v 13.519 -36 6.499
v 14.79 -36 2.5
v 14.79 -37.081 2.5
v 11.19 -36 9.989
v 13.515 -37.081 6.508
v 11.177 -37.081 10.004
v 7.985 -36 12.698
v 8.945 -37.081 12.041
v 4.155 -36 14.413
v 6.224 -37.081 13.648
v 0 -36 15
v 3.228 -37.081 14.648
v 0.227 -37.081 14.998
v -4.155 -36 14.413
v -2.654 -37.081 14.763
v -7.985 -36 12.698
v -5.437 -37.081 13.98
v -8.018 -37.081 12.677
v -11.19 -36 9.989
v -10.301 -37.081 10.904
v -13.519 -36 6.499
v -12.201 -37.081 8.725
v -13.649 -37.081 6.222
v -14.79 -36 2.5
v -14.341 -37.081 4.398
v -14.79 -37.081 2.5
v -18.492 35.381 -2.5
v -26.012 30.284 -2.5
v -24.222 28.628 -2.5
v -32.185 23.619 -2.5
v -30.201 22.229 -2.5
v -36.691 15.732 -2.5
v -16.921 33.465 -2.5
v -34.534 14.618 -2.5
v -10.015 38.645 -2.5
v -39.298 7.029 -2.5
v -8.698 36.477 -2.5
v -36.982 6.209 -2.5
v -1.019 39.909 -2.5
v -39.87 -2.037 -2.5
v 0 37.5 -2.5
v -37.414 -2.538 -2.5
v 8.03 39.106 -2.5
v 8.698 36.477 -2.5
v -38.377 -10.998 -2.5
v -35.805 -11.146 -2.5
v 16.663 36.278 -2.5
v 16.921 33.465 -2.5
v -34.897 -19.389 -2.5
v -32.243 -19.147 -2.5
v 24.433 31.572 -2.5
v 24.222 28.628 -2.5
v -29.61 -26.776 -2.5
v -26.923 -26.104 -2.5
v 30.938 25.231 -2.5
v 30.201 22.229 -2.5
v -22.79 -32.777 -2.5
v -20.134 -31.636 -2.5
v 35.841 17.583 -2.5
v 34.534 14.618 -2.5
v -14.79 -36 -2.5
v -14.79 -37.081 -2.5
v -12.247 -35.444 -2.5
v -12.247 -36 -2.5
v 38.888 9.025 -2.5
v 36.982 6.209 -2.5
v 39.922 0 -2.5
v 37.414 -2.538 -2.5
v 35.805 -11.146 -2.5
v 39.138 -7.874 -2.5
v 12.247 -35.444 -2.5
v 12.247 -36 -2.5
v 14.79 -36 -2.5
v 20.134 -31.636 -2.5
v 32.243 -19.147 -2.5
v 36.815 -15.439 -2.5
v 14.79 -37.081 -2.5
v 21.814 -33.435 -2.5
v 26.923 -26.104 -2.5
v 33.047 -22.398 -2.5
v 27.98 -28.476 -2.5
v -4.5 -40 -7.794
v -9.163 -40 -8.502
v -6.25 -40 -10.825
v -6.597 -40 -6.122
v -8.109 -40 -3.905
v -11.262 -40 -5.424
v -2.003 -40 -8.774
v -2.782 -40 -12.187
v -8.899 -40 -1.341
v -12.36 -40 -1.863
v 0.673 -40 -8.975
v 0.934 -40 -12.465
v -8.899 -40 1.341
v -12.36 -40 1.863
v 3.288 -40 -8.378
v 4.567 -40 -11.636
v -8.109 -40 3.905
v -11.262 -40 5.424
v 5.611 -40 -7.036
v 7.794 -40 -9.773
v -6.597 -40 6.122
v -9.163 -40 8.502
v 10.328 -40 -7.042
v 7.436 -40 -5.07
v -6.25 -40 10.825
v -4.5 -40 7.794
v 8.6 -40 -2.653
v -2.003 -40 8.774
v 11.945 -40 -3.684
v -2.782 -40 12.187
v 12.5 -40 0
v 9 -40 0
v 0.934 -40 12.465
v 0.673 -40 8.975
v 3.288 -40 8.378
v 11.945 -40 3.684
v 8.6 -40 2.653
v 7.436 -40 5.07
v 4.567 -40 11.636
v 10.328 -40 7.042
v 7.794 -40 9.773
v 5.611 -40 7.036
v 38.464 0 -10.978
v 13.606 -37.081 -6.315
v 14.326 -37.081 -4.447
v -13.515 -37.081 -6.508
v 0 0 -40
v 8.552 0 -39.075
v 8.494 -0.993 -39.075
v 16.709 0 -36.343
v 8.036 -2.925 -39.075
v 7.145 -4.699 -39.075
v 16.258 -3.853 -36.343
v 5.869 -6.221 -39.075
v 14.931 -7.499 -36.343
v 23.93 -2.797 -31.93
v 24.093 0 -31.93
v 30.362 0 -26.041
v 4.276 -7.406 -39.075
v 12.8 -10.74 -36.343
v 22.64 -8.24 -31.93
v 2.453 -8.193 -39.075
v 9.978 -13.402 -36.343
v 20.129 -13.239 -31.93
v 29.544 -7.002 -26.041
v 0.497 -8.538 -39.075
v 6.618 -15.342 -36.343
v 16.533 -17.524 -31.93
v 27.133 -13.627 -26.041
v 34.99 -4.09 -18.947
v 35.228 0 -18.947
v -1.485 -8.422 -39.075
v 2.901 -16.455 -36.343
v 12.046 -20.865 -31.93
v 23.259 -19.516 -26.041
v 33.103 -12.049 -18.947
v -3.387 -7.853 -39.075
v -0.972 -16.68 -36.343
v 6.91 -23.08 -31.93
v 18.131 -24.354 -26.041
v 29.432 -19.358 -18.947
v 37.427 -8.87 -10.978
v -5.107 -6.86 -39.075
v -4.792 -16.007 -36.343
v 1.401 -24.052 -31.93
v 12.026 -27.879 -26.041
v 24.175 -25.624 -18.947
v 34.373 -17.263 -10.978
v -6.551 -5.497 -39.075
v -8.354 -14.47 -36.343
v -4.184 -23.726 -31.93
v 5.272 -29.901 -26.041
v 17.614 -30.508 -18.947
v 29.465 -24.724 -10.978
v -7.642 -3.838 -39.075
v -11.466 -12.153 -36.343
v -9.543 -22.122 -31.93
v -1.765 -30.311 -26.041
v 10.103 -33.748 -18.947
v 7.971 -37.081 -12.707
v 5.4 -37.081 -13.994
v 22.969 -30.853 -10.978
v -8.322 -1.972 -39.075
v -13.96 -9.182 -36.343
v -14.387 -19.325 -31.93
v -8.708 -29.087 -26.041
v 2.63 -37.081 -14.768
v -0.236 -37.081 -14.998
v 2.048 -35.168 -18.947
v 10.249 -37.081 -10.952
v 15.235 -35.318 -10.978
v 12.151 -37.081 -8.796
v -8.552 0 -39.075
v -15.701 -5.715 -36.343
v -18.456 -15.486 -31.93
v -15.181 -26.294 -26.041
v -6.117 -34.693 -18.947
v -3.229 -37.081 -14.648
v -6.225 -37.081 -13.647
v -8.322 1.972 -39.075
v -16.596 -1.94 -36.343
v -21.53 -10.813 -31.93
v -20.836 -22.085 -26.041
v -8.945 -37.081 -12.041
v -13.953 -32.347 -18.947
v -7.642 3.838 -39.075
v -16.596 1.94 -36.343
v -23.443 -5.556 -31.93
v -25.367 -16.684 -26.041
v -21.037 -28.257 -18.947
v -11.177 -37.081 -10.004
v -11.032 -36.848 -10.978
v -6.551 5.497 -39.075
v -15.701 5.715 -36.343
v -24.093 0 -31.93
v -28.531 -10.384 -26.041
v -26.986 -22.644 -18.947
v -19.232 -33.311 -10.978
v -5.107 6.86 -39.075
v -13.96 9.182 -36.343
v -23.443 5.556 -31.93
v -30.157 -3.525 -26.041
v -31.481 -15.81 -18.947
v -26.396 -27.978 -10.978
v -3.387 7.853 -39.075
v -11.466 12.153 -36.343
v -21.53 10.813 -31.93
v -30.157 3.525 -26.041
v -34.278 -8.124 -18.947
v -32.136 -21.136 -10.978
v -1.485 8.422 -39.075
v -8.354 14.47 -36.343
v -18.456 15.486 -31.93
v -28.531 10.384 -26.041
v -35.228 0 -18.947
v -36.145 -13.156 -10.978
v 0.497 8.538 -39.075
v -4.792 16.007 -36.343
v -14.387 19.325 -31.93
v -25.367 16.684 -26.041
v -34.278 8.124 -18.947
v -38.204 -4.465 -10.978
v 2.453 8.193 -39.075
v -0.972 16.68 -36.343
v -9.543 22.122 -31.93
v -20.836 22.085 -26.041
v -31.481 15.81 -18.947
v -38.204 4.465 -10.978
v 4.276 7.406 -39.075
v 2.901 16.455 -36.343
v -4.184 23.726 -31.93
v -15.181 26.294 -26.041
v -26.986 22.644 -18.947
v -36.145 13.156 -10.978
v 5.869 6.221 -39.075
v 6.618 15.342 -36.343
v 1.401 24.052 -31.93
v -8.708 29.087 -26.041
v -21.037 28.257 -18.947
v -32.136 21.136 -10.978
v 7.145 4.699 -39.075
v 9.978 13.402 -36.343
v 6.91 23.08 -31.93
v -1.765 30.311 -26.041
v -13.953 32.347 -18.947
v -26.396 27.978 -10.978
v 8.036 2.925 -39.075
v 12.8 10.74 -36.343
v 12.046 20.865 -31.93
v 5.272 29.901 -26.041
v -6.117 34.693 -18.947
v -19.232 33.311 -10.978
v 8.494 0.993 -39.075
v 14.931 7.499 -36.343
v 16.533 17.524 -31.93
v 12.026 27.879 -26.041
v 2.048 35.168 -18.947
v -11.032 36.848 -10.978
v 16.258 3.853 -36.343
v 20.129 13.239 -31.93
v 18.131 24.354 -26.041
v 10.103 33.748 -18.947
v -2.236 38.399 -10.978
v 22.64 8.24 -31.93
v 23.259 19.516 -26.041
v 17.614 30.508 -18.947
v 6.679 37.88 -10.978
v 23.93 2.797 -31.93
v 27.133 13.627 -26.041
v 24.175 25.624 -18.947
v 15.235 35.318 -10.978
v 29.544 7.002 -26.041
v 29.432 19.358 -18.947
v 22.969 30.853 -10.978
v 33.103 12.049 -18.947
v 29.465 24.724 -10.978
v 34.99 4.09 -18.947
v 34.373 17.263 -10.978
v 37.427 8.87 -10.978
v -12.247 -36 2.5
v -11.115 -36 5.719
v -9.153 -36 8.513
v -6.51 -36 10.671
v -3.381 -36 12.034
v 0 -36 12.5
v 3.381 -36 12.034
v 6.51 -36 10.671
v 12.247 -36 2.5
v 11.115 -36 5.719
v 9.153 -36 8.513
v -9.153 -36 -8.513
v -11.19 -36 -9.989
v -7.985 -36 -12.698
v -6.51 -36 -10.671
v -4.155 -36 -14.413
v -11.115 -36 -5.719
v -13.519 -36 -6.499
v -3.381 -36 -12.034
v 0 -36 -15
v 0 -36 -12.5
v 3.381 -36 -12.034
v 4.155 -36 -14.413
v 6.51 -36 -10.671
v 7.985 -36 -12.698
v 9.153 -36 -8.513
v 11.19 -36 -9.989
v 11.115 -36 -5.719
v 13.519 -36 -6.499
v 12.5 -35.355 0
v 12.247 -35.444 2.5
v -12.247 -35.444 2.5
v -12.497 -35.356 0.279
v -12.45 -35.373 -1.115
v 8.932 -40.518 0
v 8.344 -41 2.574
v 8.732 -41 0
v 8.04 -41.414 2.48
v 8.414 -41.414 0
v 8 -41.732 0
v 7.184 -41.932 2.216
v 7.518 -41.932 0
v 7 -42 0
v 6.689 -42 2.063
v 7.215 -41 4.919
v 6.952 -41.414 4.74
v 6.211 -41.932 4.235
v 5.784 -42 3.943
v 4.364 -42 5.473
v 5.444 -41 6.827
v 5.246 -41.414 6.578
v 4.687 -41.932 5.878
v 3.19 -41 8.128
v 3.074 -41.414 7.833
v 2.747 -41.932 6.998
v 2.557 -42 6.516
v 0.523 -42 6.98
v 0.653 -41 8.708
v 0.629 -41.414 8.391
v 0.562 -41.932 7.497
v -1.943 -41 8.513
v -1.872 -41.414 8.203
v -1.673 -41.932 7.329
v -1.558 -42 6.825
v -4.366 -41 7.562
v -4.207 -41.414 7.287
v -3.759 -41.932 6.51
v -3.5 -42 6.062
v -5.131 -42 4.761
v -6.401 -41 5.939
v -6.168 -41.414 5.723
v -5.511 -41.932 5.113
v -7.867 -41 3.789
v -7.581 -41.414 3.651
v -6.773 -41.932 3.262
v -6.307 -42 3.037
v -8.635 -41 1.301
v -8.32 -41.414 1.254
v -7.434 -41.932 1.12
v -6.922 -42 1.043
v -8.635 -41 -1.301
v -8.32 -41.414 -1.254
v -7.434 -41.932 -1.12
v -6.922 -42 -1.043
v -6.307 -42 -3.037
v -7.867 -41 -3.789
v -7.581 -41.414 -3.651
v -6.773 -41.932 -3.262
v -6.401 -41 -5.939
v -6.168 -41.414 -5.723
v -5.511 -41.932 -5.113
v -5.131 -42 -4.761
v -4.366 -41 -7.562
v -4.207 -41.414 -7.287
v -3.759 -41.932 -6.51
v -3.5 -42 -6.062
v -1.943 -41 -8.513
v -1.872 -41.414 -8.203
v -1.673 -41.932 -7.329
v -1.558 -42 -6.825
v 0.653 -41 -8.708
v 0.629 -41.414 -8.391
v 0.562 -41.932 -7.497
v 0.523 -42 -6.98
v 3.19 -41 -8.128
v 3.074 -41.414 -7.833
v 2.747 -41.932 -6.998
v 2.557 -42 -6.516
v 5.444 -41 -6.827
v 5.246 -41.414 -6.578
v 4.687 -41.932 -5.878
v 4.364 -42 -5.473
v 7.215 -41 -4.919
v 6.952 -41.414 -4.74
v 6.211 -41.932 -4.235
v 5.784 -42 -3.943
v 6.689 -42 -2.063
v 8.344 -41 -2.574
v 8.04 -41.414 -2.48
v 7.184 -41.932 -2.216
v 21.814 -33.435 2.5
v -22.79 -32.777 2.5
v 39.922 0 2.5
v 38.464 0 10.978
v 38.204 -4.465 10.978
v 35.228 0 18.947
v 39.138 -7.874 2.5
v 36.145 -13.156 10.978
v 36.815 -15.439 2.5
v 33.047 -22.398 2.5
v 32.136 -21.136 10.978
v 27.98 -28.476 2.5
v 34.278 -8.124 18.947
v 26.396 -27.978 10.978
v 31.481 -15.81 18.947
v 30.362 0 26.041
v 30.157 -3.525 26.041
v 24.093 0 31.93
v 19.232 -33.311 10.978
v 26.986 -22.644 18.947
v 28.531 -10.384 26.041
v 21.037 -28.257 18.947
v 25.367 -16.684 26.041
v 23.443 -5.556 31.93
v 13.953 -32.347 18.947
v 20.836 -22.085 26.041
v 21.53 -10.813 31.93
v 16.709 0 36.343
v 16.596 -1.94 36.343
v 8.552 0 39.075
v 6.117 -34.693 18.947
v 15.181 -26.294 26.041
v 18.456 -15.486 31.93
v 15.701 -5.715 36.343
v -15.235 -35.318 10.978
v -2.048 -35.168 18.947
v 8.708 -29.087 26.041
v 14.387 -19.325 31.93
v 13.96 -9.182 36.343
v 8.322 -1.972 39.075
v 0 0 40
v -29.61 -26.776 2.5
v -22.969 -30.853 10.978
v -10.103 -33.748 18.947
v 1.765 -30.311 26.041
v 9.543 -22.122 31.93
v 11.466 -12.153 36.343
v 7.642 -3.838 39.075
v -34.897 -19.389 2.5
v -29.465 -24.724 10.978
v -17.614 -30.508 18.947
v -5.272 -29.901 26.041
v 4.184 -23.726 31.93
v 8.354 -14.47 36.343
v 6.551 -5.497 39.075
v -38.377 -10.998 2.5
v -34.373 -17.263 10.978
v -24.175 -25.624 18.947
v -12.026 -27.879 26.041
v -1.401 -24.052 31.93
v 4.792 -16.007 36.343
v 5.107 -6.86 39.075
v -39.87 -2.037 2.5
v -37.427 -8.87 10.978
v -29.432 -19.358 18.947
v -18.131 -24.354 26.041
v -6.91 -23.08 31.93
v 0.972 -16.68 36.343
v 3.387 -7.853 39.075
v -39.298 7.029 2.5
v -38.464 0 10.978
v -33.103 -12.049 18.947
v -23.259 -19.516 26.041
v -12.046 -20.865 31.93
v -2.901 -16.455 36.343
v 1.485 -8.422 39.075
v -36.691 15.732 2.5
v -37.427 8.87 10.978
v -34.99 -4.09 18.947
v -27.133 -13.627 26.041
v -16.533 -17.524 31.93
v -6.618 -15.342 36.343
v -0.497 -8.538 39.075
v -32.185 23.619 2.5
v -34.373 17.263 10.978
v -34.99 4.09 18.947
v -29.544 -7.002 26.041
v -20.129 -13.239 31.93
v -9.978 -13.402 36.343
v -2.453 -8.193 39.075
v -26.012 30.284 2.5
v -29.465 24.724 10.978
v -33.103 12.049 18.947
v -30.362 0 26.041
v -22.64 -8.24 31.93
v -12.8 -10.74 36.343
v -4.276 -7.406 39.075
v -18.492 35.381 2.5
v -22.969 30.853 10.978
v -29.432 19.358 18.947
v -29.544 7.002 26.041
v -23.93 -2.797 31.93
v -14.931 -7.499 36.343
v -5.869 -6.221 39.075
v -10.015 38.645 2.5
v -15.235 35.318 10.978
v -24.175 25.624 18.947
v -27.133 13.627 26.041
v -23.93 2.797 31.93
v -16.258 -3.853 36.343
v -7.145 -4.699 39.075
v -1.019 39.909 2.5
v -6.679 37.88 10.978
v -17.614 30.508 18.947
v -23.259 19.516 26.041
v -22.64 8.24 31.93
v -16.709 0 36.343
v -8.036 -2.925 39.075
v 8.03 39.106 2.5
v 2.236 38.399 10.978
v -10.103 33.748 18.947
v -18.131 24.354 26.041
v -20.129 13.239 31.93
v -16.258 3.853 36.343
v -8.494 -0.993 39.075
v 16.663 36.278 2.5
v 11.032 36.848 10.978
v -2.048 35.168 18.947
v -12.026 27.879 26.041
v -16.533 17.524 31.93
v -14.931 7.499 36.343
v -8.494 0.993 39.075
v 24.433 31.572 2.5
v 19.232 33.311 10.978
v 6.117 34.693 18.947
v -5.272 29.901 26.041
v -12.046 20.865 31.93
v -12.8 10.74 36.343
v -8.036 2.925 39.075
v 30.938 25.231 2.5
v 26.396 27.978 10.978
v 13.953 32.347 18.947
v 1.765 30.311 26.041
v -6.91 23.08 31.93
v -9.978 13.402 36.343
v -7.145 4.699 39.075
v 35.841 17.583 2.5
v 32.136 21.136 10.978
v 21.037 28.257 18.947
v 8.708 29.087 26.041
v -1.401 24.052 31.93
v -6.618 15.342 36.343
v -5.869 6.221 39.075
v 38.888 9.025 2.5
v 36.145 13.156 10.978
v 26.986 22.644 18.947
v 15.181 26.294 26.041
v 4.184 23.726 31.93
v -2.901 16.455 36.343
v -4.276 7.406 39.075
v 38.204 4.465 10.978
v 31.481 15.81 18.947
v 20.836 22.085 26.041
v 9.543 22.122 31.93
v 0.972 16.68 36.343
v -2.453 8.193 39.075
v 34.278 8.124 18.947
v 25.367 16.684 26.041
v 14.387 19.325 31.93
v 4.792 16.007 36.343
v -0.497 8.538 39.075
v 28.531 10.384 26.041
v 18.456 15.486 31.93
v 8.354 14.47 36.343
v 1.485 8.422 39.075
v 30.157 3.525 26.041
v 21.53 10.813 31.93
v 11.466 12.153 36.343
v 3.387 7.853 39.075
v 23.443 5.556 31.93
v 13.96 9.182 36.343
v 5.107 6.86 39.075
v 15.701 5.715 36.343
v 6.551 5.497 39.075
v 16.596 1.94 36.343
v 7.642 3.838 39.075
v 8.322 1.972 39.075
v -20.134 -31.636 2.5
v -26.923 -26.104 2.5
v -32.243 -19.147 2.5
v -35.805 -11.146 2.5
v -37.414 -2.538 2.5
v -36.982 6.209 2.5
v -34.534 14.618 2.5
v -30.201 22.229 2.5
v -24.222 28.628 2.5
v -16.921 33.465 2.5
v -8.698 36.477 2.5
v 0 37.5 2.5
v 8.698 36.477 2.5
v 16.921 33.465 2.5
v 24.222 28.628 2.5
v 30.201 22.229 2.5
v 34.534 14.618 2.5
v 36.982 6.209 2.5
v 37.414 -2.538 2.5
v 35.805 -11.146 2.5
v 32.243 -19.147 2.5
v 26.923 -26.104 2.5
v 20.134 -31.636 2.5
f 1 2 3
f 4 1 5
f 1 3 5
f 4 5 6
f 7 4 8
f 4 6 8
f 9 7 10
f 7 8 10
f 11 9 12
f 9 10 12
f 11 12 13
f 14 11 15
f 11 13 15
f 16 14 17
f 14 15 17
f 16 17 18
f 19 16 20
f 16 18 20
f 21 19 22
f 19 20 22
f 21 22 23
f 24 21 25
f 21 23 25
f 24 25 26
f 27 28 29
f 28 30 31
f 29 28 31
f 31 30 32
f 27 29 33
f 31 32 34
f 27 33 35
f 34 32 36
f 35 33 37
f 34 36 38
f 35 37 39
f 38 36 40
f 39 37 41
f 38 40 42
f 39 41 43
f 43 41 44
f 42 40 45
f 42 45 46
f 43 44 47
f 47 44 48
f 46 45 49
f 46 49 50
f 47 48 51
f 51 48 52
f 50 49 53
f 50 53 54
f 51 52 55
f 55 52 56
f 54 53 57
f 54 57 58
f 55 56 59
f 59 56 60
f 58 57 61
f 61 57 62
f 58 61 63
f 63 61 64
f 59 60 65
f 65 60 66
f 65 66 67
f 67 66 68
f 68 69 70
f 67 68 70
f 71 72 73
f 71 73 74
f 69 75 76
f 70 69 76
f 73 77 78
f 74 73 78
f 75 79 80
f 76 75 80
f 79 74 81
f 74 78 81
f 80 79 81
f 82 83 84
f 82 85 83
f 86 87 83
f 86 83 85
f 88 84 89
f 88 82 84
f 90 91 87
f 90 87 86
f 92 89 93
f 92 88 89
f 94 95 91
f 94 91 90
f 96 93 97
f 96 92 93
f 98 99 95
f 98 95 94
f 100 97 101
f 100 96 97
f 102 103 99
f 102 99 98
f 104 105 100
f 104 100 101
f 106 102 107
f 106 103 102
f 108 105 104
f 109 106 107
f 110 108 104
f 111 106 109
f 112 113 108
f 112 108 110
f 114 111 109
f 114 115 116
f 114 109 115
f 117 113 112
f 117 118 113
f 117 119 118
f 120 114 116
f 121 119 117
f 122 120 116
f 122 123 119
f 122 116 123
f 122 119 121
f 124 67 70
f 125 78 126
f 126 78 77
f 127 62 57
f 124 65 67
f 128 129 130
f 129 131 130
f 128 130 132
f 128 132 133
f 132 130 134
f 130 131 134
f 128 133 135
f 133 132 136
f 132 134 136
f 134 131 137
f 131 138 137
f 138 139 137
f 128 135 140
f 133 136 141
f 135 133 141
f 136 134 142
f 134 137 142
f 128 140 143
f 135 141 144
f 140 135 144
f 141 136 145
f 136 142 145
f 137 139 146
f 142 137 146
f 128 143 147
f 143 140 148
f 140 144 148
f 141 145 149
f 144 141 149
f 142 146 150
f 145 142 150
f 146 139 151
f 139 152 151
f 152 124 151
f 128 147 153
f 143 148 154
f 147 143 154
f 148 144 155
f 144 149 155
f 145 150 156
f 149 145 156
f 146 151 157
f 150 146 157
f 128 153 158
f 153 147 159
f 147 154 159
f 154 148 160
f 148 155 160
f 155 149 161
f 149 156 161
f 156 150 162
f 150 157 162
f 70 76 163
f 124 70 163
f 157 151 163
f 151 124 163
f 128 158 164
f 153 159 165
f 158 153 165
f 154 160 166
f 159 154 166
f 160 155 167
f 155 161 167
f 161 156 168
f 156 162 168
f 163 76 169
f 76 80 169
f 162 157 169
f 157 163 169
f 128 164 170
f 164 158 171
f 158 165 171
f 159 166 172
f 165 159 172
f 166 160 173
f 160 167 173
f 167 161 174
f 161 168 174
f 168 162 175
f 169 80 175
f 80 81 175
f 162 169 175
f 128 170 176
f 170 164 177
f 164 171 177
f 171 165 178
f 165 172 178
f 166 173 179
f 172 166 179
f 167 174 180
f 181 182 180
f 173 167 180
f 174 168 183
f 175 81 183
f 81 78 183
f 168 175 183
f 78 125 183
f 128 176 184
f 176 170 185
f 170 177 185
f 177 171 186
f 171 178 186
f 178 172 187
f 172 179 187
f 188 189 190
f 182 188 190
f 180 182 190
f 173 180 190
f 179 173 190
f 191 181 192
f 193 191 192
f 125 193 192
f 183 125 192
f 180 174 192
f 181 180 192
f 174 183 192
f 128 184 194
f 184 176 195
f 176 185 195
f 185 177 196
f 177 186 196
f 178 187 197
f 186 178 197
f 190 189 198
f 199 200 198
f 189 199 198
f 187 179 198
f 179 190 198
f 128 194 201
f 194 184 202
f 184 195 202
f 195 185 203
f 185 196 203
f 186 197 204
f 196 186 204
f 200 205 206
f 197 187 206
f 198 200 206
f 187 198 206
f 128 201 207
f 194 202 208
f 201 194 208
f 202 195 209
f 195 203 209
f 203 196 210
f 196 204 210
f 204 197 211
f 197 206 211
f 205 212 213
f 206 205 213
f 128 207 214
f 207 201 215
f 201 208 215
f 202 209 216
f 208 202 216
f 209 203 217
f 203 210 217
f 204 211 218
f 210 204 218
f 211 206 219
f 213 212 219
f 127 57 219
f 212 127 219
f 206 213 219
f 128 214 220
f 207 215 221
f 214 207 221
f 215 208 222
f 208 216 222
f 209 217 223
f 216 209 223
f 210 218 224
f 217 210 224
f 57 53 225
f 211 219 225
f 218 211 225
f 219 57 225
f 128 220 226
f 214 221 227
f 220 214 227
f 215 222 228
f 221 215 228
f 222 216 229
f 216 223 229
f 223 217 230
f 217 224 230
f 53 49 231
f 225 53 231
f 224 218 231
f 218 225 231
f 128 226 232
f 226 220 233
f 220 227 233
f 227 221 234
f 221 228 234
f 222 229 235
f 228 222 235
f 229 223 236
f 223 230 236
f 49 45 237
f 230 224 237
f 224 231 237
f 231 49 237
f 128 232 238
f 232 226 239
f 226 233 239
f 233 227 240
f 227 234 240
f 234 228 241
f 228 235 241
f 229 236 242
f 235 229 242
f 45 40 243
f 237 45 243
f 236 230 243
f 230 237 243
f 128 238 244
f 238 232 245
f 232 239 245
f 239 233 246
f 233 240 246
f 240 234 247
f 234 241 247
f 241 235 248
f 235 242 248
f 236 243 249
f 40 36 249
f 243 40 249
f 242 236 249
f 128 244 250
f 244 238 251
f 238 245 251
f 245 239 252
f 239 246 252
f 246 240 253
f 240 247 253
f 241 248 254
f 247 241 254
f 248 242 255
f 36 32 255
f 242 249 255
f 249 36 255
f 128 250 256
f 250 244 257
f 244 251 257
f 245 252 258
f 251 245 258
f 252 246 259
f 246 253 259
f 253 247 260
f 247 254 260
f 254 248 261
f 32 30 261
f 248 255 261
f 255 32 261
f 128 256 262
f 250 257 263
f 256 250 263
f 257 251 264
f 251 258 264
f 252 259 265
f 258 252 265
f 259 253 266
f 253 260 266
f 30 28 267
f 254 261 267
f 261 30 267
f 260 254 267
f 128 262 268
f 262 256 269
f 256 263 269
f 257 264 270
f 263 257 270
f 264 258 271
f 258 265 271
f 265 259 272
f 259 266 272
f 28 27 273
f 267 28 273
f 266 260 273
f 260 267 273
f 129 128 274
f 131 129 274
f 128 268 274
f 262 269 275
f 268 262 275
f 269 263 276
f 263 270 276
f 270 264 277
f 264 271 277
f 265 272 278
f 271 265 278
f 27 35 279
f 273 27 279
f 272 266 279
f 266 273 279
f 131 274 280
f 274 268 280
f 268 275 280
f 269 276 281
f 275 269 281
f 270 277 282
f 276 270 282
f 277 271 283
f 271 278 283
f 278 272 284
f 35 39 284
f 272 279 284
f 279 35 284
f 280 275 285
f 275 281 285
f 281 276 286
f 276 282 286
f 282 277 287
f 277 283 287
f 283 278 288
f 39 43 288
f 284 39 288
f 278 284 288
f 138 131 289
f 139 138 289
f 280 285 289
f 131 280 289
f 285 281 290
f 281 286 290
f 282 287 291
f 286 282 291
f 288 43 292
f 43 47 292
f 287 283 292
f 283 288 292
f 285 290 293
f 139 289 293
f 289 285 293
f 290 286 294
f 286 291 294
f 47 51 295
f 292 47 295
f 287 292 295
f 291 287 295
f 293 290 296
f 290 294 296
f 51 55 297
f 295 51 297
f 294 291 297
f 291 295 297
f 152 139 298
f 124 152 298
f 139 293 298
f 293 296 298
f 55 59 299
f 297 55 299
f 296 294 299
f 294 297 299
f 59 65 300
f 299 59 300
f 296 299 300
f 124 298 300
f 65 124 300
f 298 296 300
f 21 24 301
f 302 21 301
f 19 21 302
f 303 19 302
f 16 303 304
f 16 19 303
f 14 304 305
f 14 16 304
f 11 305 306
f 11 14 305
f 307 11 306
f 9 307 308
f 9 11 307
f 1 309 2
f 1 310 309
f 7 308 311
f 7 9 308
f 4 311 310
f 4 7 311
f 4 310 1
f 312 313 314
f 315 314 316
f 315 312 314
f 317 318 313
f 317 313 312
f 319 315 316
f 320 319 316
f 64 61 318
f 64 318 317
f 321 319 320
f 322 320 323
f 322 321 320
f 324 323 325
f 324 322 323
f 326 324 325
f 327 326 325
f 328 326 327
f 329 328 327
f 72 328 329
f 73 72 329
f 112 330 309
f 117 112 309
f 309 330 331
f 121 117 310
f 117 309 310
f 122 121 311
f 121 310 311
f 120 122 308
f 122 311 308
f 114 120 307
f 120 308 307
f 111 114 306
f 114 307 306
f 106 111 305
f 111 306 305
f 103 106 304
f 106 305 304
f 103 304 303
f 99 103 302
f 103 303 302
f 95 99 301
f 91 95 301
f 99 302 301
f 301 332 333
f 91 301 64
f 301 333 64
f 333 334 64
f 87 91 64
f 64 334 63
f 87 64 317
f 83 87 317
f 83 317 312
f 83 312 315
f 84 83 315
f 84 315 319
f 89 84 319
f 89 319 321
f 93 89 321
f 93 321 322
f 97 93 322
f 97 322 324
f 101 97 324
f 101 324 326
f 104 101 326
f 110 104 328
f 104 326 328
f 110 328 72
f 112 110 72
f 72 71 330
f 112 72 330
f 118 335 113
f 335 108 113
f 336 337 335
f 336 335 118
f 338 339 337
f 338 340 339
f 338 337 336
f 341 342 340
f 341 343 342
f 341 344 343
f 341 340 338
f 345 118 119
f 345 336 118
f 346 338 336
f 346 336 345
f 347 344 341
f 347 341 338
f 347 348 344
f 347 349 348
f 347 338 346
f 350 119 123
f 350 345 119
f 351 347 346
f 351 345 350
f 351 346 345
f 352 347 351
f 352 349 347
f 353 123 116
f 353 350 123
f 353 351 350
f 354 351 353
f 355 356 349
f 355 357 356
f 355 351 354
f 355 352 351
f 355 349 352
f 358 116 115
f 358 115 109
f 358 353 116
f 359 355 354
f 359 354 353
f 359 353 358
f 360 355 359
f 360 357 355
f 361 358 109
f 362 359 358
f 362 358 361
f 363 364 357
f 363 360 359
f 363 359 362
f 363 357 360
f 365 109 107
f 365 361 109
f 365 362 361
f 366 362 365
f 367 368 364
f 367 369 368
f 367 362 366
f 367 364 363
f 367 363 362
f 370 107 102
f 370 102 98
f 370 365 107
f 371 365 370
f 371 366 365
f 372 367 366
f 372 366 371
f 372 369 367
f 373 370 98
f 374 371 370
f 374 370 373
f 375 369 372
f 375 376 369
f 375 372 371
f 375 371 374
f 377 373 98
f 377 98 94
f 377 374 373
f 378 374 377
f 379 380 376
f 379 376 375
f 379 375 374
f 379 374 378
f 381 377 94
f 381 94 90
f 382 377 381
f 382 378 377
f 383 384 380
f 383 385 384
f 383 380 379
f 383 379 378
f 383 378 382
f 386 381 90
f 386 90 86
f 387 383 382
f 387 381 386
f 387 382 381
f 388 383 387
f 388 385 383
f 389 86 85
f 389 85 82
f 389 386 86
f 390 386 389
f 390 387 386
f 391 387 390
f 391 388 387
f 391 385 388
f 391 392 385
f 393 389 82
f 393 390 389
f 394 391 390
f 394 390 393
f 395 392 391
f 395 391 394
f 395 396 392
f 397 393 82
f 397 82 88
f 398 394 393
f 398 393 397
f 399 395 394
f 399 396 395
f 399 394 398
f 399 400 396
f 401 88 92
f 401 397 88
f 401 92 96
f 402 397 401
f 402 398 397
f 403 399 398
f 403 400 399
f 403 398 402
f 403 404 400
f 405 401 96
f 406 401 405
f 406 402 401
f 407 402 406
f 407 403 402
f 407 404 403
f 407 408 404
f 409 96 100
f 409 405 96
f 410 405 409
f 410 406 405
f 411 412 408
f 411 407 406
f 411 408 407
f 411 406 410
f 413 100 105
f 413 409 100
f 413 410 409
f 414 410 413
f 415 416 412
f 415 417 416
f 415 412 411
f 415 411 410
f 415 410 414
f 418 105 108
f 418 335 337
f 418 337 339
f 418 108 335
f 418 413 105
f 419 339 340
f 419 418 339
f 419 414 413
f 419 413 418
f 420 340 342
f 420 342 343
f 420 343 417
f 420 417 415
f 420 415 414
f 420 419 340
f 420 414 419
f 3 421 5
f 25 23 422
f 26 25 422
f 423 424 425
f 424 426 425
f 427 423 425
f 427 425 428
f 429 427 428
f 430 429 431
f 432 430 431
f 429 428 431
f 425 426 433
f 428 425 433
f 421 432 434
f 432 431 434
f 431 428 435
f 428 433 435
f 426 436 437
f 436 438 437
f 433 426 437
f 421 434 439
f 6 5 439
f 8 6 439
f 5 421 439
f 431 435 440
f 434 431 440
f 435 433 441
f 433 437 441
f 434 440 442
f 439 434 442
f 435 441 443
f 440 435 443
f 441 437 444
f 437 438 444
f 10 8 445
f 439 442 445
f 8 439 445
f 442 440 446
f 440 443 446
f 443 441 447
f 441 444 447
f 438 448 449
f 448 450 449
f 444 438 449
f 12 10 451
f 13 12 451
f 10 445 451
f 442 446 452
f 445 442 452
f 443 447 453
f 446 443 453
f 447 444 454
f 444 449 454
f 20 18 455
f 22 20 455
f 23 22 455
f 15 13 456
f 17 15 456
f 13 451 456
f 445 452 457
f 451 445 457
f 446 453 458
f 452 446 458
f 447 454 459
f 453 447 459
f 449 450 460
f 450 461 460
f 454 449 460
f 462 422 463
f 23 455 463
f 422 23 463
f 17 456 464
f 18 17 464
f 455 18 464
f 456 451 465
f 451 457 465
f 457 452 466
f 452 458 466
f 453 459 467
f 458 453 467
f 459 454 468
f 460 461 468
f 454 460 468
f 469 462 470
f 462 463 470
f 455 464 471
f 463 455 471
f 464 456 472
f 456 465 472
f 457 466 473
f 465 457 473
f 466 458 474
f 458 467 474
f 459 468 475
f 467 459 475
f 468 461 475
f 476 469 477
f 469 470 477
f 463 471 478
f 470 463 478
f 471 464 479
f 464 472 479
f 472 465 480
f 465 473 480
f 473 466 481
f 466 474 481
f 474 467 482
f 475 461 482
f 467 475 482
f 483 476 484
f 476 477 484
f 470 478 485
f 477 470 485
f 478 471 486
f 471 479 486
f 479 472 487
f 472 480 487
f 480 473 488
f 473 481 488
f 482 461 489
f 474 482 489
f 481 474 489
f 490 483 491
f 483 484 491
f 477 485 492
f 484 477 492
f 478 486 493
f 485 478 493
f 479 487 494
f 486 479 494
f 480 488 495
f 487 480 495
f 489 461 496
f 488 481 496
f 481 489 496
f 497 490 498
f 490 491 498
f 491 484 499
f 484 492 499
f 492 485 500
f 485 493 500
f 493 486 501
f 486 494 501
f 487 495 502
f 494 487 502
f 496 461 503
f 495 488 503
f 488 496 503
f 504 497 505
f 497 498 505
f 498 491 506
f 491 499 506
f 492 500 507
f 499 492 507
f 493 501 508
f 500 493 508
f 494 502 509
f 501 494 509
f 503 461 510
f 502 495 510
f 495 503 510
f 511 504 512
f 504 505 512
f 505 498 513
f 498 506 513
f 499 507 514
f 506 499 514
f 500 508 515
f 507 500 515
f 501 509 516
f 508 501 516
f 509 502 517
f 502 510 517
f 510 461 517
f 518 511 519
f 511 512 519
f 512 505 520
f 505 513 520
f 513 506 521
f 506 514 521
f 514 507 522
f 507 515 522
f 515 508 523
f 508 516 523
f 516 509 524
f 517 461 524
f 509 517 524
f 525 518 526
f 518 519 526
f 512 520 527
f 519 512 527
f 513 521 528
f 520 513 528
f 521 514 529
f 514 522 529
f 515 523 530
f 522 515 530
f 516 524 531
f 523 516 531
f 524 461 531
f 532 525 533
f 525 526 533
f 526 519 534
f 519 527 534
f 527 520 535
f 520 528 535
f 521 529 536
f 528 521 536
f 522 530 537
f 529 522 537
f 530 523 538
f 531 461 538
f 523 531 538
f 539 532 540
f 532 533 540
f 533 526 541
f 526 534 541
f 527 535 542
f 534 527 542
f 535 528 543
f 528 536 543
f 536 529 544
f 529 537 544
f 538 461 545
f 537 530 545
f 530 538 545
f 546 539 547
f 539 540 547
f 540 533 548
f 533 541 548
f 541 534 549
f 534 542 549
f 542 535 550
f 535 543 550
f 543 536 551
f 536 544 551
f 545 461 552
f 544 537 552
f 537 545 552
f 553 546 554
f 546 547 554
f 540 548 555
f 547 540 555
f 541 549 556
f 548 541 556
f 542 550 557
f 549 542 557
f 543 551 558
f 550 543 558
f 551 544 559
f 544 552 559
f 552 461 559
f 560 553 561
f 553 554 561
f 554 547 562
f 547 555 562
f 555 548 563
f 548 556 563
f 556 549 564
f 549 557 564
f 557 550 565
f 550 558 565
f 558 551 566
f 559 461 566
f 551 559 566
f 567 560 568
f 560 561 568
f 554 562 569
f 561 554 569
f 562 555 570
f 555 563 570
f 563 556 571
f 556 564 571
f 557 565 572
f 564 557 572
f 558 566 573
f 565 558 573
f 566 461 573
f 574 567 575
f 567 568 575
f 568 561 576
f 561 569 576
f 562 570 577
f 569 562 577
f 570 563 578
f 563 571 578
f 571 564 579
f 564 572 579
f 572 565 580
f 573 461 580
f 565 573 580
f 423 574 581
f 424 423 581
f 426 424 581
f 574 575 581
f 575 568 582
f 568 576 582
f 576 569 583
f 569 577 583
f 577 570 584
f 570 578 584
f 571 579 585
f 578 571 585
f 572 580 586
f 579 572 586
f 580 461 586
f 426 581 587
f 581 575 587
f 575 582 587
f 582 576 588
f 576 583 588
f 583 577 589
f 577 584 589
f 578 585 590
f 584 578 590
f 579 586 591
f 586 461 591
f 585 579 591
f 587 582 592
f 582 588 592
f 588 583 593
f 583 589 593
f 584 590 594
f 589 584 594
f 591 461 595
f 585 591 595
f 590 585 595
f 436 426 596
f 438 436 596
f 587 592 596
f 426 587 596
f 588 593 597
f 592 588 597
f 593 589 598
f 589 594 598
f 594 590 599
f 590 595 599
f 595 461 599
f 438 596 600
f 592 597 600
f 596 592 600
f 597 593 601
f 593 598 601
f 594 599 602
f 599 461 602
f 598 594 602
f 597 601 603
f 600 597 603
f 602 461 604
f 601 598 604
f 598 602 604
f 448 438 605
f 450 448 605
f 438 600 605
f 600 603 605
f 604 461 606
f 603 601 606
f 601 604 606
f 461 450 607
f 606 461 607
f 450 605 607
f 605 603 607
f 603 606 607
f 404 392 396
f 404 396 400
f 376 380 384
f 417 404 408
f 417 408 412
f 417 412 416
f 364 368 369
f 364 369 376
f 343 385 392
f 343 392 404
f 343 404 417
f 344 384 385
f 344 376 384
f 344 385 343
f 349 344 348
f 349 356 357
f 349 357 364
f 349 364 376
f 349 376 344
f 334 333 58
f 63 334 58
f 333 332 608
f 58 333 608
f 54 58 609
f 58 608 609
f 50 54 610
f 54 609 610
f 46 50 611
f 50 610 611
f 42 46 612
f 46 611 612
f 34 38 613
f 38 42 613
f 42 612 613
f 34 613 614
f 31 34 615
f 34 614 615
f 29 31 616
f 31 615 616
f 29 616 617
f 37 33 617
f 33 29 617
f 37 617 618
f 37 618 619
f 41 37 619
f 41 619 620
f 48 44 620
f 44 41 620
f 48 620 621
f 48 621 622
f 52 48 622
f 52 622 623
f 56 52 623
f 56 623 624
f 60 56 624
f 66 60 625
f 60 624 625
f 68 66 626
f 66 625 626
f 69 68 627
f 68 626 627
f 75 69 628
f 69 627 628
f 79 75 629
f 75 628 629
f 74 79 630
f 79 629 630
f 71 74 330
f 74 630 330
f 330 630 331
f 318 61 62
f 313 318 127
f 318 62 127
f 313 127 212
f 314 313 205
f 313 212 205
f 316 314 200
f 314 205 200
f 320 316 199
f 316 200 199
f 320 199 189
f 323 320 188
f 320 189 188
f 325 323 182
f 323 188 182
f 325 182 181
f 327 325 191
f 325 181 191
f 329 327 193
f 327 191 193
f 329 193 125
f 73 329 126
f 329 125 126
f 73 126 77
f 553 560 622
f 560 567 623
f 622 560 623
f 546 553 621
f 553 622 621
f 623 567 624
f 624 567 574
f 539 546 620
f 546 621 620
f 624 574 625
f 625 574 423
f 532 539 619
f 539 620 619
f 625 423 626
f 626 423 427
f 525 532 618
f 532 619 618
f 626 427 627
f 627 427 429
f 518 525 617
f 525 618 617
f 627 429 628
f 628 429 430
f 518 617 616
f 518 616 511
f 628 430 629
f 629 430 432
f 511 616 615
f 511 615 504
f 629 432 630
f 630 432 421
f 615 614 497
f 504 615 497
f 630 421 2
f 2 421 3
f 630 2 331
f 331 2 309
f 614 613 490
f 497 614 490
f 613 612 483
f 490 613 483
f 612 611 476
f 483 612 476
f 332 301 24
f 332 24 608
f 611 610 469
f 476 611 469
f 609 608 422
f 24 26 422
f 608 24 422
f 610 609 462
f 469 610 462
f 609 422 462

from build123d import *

# Parameters (mm, degrees)
F2_R     = 12.5
F3_DEPTH = 40
F4_R     = 15
F4_R_2   = 12.5
F5_DEPTH = 4
F6_R     = 9
F7_DEPTH = 2
F8_R     = 1.99999


# Not quite as in the source:
# - a fillet or chamfer is up to 0.001 mm smaller than in the source, because OpenCascade refuses the exact size


with BuildPart() as f1:
    # F0 (on Front) → F1 (revolve)
    with BuildSketch(Plane.XZ):
        with BuildLine():
            Line((0, 40), (0, -40))
            ThreePointArc((0, -40), (27.3861278753, -29.1547594742), (39.9217985567, -2.5))
            Line((39.9217985567, -2.5), (37.5, -2.5))
            Line((37.5, -2.5), (37.5, 0))
            Line((37.5, 0), (37.5, 2.5))
            Line((37.5, 2.5), (39.9217985567, 2.5))
            ThreePointArc((39.9217985567, 2.5), (27.3861278753, 29.1547594742), (0, 40))
        make_face()
    revolve(axis=Axis((0, 0, 0), (0, 0, -1)))

    # F2 (on Front) → F3 (join)
    with BuildSketch(Plane.XZ):
        Circle(F2_R)
    extrude(amount=F3_DEPTH)

    # F4 (on face) → F5 (cut)
    with BuildSketch(Plane.XZ.offset(40)):
        Circle(F4_R)
        Circle(F4_R_2, mode=Mode.SUBTRACT)
    extrude(amount=-F5_DEPTH, mode=Mode.SUBTRACT)

    # F6 (on face) → F7 (join)
    with BuildSketch(Plane.XZ.offset(40)):
        Circle(F6_R)
    extrude(amount=F7_DEPTH)

    # F8 (radius 2 in the source; OpenCascade refuses exactly that, so slightly less here)
    f8_edges = [f1.edges().sort_by_distance(p)[0] for p in [
        (-9, -42, 0),
    ]]
    fillet(f8_edges, radius=F8_R)


solid = f1.part
